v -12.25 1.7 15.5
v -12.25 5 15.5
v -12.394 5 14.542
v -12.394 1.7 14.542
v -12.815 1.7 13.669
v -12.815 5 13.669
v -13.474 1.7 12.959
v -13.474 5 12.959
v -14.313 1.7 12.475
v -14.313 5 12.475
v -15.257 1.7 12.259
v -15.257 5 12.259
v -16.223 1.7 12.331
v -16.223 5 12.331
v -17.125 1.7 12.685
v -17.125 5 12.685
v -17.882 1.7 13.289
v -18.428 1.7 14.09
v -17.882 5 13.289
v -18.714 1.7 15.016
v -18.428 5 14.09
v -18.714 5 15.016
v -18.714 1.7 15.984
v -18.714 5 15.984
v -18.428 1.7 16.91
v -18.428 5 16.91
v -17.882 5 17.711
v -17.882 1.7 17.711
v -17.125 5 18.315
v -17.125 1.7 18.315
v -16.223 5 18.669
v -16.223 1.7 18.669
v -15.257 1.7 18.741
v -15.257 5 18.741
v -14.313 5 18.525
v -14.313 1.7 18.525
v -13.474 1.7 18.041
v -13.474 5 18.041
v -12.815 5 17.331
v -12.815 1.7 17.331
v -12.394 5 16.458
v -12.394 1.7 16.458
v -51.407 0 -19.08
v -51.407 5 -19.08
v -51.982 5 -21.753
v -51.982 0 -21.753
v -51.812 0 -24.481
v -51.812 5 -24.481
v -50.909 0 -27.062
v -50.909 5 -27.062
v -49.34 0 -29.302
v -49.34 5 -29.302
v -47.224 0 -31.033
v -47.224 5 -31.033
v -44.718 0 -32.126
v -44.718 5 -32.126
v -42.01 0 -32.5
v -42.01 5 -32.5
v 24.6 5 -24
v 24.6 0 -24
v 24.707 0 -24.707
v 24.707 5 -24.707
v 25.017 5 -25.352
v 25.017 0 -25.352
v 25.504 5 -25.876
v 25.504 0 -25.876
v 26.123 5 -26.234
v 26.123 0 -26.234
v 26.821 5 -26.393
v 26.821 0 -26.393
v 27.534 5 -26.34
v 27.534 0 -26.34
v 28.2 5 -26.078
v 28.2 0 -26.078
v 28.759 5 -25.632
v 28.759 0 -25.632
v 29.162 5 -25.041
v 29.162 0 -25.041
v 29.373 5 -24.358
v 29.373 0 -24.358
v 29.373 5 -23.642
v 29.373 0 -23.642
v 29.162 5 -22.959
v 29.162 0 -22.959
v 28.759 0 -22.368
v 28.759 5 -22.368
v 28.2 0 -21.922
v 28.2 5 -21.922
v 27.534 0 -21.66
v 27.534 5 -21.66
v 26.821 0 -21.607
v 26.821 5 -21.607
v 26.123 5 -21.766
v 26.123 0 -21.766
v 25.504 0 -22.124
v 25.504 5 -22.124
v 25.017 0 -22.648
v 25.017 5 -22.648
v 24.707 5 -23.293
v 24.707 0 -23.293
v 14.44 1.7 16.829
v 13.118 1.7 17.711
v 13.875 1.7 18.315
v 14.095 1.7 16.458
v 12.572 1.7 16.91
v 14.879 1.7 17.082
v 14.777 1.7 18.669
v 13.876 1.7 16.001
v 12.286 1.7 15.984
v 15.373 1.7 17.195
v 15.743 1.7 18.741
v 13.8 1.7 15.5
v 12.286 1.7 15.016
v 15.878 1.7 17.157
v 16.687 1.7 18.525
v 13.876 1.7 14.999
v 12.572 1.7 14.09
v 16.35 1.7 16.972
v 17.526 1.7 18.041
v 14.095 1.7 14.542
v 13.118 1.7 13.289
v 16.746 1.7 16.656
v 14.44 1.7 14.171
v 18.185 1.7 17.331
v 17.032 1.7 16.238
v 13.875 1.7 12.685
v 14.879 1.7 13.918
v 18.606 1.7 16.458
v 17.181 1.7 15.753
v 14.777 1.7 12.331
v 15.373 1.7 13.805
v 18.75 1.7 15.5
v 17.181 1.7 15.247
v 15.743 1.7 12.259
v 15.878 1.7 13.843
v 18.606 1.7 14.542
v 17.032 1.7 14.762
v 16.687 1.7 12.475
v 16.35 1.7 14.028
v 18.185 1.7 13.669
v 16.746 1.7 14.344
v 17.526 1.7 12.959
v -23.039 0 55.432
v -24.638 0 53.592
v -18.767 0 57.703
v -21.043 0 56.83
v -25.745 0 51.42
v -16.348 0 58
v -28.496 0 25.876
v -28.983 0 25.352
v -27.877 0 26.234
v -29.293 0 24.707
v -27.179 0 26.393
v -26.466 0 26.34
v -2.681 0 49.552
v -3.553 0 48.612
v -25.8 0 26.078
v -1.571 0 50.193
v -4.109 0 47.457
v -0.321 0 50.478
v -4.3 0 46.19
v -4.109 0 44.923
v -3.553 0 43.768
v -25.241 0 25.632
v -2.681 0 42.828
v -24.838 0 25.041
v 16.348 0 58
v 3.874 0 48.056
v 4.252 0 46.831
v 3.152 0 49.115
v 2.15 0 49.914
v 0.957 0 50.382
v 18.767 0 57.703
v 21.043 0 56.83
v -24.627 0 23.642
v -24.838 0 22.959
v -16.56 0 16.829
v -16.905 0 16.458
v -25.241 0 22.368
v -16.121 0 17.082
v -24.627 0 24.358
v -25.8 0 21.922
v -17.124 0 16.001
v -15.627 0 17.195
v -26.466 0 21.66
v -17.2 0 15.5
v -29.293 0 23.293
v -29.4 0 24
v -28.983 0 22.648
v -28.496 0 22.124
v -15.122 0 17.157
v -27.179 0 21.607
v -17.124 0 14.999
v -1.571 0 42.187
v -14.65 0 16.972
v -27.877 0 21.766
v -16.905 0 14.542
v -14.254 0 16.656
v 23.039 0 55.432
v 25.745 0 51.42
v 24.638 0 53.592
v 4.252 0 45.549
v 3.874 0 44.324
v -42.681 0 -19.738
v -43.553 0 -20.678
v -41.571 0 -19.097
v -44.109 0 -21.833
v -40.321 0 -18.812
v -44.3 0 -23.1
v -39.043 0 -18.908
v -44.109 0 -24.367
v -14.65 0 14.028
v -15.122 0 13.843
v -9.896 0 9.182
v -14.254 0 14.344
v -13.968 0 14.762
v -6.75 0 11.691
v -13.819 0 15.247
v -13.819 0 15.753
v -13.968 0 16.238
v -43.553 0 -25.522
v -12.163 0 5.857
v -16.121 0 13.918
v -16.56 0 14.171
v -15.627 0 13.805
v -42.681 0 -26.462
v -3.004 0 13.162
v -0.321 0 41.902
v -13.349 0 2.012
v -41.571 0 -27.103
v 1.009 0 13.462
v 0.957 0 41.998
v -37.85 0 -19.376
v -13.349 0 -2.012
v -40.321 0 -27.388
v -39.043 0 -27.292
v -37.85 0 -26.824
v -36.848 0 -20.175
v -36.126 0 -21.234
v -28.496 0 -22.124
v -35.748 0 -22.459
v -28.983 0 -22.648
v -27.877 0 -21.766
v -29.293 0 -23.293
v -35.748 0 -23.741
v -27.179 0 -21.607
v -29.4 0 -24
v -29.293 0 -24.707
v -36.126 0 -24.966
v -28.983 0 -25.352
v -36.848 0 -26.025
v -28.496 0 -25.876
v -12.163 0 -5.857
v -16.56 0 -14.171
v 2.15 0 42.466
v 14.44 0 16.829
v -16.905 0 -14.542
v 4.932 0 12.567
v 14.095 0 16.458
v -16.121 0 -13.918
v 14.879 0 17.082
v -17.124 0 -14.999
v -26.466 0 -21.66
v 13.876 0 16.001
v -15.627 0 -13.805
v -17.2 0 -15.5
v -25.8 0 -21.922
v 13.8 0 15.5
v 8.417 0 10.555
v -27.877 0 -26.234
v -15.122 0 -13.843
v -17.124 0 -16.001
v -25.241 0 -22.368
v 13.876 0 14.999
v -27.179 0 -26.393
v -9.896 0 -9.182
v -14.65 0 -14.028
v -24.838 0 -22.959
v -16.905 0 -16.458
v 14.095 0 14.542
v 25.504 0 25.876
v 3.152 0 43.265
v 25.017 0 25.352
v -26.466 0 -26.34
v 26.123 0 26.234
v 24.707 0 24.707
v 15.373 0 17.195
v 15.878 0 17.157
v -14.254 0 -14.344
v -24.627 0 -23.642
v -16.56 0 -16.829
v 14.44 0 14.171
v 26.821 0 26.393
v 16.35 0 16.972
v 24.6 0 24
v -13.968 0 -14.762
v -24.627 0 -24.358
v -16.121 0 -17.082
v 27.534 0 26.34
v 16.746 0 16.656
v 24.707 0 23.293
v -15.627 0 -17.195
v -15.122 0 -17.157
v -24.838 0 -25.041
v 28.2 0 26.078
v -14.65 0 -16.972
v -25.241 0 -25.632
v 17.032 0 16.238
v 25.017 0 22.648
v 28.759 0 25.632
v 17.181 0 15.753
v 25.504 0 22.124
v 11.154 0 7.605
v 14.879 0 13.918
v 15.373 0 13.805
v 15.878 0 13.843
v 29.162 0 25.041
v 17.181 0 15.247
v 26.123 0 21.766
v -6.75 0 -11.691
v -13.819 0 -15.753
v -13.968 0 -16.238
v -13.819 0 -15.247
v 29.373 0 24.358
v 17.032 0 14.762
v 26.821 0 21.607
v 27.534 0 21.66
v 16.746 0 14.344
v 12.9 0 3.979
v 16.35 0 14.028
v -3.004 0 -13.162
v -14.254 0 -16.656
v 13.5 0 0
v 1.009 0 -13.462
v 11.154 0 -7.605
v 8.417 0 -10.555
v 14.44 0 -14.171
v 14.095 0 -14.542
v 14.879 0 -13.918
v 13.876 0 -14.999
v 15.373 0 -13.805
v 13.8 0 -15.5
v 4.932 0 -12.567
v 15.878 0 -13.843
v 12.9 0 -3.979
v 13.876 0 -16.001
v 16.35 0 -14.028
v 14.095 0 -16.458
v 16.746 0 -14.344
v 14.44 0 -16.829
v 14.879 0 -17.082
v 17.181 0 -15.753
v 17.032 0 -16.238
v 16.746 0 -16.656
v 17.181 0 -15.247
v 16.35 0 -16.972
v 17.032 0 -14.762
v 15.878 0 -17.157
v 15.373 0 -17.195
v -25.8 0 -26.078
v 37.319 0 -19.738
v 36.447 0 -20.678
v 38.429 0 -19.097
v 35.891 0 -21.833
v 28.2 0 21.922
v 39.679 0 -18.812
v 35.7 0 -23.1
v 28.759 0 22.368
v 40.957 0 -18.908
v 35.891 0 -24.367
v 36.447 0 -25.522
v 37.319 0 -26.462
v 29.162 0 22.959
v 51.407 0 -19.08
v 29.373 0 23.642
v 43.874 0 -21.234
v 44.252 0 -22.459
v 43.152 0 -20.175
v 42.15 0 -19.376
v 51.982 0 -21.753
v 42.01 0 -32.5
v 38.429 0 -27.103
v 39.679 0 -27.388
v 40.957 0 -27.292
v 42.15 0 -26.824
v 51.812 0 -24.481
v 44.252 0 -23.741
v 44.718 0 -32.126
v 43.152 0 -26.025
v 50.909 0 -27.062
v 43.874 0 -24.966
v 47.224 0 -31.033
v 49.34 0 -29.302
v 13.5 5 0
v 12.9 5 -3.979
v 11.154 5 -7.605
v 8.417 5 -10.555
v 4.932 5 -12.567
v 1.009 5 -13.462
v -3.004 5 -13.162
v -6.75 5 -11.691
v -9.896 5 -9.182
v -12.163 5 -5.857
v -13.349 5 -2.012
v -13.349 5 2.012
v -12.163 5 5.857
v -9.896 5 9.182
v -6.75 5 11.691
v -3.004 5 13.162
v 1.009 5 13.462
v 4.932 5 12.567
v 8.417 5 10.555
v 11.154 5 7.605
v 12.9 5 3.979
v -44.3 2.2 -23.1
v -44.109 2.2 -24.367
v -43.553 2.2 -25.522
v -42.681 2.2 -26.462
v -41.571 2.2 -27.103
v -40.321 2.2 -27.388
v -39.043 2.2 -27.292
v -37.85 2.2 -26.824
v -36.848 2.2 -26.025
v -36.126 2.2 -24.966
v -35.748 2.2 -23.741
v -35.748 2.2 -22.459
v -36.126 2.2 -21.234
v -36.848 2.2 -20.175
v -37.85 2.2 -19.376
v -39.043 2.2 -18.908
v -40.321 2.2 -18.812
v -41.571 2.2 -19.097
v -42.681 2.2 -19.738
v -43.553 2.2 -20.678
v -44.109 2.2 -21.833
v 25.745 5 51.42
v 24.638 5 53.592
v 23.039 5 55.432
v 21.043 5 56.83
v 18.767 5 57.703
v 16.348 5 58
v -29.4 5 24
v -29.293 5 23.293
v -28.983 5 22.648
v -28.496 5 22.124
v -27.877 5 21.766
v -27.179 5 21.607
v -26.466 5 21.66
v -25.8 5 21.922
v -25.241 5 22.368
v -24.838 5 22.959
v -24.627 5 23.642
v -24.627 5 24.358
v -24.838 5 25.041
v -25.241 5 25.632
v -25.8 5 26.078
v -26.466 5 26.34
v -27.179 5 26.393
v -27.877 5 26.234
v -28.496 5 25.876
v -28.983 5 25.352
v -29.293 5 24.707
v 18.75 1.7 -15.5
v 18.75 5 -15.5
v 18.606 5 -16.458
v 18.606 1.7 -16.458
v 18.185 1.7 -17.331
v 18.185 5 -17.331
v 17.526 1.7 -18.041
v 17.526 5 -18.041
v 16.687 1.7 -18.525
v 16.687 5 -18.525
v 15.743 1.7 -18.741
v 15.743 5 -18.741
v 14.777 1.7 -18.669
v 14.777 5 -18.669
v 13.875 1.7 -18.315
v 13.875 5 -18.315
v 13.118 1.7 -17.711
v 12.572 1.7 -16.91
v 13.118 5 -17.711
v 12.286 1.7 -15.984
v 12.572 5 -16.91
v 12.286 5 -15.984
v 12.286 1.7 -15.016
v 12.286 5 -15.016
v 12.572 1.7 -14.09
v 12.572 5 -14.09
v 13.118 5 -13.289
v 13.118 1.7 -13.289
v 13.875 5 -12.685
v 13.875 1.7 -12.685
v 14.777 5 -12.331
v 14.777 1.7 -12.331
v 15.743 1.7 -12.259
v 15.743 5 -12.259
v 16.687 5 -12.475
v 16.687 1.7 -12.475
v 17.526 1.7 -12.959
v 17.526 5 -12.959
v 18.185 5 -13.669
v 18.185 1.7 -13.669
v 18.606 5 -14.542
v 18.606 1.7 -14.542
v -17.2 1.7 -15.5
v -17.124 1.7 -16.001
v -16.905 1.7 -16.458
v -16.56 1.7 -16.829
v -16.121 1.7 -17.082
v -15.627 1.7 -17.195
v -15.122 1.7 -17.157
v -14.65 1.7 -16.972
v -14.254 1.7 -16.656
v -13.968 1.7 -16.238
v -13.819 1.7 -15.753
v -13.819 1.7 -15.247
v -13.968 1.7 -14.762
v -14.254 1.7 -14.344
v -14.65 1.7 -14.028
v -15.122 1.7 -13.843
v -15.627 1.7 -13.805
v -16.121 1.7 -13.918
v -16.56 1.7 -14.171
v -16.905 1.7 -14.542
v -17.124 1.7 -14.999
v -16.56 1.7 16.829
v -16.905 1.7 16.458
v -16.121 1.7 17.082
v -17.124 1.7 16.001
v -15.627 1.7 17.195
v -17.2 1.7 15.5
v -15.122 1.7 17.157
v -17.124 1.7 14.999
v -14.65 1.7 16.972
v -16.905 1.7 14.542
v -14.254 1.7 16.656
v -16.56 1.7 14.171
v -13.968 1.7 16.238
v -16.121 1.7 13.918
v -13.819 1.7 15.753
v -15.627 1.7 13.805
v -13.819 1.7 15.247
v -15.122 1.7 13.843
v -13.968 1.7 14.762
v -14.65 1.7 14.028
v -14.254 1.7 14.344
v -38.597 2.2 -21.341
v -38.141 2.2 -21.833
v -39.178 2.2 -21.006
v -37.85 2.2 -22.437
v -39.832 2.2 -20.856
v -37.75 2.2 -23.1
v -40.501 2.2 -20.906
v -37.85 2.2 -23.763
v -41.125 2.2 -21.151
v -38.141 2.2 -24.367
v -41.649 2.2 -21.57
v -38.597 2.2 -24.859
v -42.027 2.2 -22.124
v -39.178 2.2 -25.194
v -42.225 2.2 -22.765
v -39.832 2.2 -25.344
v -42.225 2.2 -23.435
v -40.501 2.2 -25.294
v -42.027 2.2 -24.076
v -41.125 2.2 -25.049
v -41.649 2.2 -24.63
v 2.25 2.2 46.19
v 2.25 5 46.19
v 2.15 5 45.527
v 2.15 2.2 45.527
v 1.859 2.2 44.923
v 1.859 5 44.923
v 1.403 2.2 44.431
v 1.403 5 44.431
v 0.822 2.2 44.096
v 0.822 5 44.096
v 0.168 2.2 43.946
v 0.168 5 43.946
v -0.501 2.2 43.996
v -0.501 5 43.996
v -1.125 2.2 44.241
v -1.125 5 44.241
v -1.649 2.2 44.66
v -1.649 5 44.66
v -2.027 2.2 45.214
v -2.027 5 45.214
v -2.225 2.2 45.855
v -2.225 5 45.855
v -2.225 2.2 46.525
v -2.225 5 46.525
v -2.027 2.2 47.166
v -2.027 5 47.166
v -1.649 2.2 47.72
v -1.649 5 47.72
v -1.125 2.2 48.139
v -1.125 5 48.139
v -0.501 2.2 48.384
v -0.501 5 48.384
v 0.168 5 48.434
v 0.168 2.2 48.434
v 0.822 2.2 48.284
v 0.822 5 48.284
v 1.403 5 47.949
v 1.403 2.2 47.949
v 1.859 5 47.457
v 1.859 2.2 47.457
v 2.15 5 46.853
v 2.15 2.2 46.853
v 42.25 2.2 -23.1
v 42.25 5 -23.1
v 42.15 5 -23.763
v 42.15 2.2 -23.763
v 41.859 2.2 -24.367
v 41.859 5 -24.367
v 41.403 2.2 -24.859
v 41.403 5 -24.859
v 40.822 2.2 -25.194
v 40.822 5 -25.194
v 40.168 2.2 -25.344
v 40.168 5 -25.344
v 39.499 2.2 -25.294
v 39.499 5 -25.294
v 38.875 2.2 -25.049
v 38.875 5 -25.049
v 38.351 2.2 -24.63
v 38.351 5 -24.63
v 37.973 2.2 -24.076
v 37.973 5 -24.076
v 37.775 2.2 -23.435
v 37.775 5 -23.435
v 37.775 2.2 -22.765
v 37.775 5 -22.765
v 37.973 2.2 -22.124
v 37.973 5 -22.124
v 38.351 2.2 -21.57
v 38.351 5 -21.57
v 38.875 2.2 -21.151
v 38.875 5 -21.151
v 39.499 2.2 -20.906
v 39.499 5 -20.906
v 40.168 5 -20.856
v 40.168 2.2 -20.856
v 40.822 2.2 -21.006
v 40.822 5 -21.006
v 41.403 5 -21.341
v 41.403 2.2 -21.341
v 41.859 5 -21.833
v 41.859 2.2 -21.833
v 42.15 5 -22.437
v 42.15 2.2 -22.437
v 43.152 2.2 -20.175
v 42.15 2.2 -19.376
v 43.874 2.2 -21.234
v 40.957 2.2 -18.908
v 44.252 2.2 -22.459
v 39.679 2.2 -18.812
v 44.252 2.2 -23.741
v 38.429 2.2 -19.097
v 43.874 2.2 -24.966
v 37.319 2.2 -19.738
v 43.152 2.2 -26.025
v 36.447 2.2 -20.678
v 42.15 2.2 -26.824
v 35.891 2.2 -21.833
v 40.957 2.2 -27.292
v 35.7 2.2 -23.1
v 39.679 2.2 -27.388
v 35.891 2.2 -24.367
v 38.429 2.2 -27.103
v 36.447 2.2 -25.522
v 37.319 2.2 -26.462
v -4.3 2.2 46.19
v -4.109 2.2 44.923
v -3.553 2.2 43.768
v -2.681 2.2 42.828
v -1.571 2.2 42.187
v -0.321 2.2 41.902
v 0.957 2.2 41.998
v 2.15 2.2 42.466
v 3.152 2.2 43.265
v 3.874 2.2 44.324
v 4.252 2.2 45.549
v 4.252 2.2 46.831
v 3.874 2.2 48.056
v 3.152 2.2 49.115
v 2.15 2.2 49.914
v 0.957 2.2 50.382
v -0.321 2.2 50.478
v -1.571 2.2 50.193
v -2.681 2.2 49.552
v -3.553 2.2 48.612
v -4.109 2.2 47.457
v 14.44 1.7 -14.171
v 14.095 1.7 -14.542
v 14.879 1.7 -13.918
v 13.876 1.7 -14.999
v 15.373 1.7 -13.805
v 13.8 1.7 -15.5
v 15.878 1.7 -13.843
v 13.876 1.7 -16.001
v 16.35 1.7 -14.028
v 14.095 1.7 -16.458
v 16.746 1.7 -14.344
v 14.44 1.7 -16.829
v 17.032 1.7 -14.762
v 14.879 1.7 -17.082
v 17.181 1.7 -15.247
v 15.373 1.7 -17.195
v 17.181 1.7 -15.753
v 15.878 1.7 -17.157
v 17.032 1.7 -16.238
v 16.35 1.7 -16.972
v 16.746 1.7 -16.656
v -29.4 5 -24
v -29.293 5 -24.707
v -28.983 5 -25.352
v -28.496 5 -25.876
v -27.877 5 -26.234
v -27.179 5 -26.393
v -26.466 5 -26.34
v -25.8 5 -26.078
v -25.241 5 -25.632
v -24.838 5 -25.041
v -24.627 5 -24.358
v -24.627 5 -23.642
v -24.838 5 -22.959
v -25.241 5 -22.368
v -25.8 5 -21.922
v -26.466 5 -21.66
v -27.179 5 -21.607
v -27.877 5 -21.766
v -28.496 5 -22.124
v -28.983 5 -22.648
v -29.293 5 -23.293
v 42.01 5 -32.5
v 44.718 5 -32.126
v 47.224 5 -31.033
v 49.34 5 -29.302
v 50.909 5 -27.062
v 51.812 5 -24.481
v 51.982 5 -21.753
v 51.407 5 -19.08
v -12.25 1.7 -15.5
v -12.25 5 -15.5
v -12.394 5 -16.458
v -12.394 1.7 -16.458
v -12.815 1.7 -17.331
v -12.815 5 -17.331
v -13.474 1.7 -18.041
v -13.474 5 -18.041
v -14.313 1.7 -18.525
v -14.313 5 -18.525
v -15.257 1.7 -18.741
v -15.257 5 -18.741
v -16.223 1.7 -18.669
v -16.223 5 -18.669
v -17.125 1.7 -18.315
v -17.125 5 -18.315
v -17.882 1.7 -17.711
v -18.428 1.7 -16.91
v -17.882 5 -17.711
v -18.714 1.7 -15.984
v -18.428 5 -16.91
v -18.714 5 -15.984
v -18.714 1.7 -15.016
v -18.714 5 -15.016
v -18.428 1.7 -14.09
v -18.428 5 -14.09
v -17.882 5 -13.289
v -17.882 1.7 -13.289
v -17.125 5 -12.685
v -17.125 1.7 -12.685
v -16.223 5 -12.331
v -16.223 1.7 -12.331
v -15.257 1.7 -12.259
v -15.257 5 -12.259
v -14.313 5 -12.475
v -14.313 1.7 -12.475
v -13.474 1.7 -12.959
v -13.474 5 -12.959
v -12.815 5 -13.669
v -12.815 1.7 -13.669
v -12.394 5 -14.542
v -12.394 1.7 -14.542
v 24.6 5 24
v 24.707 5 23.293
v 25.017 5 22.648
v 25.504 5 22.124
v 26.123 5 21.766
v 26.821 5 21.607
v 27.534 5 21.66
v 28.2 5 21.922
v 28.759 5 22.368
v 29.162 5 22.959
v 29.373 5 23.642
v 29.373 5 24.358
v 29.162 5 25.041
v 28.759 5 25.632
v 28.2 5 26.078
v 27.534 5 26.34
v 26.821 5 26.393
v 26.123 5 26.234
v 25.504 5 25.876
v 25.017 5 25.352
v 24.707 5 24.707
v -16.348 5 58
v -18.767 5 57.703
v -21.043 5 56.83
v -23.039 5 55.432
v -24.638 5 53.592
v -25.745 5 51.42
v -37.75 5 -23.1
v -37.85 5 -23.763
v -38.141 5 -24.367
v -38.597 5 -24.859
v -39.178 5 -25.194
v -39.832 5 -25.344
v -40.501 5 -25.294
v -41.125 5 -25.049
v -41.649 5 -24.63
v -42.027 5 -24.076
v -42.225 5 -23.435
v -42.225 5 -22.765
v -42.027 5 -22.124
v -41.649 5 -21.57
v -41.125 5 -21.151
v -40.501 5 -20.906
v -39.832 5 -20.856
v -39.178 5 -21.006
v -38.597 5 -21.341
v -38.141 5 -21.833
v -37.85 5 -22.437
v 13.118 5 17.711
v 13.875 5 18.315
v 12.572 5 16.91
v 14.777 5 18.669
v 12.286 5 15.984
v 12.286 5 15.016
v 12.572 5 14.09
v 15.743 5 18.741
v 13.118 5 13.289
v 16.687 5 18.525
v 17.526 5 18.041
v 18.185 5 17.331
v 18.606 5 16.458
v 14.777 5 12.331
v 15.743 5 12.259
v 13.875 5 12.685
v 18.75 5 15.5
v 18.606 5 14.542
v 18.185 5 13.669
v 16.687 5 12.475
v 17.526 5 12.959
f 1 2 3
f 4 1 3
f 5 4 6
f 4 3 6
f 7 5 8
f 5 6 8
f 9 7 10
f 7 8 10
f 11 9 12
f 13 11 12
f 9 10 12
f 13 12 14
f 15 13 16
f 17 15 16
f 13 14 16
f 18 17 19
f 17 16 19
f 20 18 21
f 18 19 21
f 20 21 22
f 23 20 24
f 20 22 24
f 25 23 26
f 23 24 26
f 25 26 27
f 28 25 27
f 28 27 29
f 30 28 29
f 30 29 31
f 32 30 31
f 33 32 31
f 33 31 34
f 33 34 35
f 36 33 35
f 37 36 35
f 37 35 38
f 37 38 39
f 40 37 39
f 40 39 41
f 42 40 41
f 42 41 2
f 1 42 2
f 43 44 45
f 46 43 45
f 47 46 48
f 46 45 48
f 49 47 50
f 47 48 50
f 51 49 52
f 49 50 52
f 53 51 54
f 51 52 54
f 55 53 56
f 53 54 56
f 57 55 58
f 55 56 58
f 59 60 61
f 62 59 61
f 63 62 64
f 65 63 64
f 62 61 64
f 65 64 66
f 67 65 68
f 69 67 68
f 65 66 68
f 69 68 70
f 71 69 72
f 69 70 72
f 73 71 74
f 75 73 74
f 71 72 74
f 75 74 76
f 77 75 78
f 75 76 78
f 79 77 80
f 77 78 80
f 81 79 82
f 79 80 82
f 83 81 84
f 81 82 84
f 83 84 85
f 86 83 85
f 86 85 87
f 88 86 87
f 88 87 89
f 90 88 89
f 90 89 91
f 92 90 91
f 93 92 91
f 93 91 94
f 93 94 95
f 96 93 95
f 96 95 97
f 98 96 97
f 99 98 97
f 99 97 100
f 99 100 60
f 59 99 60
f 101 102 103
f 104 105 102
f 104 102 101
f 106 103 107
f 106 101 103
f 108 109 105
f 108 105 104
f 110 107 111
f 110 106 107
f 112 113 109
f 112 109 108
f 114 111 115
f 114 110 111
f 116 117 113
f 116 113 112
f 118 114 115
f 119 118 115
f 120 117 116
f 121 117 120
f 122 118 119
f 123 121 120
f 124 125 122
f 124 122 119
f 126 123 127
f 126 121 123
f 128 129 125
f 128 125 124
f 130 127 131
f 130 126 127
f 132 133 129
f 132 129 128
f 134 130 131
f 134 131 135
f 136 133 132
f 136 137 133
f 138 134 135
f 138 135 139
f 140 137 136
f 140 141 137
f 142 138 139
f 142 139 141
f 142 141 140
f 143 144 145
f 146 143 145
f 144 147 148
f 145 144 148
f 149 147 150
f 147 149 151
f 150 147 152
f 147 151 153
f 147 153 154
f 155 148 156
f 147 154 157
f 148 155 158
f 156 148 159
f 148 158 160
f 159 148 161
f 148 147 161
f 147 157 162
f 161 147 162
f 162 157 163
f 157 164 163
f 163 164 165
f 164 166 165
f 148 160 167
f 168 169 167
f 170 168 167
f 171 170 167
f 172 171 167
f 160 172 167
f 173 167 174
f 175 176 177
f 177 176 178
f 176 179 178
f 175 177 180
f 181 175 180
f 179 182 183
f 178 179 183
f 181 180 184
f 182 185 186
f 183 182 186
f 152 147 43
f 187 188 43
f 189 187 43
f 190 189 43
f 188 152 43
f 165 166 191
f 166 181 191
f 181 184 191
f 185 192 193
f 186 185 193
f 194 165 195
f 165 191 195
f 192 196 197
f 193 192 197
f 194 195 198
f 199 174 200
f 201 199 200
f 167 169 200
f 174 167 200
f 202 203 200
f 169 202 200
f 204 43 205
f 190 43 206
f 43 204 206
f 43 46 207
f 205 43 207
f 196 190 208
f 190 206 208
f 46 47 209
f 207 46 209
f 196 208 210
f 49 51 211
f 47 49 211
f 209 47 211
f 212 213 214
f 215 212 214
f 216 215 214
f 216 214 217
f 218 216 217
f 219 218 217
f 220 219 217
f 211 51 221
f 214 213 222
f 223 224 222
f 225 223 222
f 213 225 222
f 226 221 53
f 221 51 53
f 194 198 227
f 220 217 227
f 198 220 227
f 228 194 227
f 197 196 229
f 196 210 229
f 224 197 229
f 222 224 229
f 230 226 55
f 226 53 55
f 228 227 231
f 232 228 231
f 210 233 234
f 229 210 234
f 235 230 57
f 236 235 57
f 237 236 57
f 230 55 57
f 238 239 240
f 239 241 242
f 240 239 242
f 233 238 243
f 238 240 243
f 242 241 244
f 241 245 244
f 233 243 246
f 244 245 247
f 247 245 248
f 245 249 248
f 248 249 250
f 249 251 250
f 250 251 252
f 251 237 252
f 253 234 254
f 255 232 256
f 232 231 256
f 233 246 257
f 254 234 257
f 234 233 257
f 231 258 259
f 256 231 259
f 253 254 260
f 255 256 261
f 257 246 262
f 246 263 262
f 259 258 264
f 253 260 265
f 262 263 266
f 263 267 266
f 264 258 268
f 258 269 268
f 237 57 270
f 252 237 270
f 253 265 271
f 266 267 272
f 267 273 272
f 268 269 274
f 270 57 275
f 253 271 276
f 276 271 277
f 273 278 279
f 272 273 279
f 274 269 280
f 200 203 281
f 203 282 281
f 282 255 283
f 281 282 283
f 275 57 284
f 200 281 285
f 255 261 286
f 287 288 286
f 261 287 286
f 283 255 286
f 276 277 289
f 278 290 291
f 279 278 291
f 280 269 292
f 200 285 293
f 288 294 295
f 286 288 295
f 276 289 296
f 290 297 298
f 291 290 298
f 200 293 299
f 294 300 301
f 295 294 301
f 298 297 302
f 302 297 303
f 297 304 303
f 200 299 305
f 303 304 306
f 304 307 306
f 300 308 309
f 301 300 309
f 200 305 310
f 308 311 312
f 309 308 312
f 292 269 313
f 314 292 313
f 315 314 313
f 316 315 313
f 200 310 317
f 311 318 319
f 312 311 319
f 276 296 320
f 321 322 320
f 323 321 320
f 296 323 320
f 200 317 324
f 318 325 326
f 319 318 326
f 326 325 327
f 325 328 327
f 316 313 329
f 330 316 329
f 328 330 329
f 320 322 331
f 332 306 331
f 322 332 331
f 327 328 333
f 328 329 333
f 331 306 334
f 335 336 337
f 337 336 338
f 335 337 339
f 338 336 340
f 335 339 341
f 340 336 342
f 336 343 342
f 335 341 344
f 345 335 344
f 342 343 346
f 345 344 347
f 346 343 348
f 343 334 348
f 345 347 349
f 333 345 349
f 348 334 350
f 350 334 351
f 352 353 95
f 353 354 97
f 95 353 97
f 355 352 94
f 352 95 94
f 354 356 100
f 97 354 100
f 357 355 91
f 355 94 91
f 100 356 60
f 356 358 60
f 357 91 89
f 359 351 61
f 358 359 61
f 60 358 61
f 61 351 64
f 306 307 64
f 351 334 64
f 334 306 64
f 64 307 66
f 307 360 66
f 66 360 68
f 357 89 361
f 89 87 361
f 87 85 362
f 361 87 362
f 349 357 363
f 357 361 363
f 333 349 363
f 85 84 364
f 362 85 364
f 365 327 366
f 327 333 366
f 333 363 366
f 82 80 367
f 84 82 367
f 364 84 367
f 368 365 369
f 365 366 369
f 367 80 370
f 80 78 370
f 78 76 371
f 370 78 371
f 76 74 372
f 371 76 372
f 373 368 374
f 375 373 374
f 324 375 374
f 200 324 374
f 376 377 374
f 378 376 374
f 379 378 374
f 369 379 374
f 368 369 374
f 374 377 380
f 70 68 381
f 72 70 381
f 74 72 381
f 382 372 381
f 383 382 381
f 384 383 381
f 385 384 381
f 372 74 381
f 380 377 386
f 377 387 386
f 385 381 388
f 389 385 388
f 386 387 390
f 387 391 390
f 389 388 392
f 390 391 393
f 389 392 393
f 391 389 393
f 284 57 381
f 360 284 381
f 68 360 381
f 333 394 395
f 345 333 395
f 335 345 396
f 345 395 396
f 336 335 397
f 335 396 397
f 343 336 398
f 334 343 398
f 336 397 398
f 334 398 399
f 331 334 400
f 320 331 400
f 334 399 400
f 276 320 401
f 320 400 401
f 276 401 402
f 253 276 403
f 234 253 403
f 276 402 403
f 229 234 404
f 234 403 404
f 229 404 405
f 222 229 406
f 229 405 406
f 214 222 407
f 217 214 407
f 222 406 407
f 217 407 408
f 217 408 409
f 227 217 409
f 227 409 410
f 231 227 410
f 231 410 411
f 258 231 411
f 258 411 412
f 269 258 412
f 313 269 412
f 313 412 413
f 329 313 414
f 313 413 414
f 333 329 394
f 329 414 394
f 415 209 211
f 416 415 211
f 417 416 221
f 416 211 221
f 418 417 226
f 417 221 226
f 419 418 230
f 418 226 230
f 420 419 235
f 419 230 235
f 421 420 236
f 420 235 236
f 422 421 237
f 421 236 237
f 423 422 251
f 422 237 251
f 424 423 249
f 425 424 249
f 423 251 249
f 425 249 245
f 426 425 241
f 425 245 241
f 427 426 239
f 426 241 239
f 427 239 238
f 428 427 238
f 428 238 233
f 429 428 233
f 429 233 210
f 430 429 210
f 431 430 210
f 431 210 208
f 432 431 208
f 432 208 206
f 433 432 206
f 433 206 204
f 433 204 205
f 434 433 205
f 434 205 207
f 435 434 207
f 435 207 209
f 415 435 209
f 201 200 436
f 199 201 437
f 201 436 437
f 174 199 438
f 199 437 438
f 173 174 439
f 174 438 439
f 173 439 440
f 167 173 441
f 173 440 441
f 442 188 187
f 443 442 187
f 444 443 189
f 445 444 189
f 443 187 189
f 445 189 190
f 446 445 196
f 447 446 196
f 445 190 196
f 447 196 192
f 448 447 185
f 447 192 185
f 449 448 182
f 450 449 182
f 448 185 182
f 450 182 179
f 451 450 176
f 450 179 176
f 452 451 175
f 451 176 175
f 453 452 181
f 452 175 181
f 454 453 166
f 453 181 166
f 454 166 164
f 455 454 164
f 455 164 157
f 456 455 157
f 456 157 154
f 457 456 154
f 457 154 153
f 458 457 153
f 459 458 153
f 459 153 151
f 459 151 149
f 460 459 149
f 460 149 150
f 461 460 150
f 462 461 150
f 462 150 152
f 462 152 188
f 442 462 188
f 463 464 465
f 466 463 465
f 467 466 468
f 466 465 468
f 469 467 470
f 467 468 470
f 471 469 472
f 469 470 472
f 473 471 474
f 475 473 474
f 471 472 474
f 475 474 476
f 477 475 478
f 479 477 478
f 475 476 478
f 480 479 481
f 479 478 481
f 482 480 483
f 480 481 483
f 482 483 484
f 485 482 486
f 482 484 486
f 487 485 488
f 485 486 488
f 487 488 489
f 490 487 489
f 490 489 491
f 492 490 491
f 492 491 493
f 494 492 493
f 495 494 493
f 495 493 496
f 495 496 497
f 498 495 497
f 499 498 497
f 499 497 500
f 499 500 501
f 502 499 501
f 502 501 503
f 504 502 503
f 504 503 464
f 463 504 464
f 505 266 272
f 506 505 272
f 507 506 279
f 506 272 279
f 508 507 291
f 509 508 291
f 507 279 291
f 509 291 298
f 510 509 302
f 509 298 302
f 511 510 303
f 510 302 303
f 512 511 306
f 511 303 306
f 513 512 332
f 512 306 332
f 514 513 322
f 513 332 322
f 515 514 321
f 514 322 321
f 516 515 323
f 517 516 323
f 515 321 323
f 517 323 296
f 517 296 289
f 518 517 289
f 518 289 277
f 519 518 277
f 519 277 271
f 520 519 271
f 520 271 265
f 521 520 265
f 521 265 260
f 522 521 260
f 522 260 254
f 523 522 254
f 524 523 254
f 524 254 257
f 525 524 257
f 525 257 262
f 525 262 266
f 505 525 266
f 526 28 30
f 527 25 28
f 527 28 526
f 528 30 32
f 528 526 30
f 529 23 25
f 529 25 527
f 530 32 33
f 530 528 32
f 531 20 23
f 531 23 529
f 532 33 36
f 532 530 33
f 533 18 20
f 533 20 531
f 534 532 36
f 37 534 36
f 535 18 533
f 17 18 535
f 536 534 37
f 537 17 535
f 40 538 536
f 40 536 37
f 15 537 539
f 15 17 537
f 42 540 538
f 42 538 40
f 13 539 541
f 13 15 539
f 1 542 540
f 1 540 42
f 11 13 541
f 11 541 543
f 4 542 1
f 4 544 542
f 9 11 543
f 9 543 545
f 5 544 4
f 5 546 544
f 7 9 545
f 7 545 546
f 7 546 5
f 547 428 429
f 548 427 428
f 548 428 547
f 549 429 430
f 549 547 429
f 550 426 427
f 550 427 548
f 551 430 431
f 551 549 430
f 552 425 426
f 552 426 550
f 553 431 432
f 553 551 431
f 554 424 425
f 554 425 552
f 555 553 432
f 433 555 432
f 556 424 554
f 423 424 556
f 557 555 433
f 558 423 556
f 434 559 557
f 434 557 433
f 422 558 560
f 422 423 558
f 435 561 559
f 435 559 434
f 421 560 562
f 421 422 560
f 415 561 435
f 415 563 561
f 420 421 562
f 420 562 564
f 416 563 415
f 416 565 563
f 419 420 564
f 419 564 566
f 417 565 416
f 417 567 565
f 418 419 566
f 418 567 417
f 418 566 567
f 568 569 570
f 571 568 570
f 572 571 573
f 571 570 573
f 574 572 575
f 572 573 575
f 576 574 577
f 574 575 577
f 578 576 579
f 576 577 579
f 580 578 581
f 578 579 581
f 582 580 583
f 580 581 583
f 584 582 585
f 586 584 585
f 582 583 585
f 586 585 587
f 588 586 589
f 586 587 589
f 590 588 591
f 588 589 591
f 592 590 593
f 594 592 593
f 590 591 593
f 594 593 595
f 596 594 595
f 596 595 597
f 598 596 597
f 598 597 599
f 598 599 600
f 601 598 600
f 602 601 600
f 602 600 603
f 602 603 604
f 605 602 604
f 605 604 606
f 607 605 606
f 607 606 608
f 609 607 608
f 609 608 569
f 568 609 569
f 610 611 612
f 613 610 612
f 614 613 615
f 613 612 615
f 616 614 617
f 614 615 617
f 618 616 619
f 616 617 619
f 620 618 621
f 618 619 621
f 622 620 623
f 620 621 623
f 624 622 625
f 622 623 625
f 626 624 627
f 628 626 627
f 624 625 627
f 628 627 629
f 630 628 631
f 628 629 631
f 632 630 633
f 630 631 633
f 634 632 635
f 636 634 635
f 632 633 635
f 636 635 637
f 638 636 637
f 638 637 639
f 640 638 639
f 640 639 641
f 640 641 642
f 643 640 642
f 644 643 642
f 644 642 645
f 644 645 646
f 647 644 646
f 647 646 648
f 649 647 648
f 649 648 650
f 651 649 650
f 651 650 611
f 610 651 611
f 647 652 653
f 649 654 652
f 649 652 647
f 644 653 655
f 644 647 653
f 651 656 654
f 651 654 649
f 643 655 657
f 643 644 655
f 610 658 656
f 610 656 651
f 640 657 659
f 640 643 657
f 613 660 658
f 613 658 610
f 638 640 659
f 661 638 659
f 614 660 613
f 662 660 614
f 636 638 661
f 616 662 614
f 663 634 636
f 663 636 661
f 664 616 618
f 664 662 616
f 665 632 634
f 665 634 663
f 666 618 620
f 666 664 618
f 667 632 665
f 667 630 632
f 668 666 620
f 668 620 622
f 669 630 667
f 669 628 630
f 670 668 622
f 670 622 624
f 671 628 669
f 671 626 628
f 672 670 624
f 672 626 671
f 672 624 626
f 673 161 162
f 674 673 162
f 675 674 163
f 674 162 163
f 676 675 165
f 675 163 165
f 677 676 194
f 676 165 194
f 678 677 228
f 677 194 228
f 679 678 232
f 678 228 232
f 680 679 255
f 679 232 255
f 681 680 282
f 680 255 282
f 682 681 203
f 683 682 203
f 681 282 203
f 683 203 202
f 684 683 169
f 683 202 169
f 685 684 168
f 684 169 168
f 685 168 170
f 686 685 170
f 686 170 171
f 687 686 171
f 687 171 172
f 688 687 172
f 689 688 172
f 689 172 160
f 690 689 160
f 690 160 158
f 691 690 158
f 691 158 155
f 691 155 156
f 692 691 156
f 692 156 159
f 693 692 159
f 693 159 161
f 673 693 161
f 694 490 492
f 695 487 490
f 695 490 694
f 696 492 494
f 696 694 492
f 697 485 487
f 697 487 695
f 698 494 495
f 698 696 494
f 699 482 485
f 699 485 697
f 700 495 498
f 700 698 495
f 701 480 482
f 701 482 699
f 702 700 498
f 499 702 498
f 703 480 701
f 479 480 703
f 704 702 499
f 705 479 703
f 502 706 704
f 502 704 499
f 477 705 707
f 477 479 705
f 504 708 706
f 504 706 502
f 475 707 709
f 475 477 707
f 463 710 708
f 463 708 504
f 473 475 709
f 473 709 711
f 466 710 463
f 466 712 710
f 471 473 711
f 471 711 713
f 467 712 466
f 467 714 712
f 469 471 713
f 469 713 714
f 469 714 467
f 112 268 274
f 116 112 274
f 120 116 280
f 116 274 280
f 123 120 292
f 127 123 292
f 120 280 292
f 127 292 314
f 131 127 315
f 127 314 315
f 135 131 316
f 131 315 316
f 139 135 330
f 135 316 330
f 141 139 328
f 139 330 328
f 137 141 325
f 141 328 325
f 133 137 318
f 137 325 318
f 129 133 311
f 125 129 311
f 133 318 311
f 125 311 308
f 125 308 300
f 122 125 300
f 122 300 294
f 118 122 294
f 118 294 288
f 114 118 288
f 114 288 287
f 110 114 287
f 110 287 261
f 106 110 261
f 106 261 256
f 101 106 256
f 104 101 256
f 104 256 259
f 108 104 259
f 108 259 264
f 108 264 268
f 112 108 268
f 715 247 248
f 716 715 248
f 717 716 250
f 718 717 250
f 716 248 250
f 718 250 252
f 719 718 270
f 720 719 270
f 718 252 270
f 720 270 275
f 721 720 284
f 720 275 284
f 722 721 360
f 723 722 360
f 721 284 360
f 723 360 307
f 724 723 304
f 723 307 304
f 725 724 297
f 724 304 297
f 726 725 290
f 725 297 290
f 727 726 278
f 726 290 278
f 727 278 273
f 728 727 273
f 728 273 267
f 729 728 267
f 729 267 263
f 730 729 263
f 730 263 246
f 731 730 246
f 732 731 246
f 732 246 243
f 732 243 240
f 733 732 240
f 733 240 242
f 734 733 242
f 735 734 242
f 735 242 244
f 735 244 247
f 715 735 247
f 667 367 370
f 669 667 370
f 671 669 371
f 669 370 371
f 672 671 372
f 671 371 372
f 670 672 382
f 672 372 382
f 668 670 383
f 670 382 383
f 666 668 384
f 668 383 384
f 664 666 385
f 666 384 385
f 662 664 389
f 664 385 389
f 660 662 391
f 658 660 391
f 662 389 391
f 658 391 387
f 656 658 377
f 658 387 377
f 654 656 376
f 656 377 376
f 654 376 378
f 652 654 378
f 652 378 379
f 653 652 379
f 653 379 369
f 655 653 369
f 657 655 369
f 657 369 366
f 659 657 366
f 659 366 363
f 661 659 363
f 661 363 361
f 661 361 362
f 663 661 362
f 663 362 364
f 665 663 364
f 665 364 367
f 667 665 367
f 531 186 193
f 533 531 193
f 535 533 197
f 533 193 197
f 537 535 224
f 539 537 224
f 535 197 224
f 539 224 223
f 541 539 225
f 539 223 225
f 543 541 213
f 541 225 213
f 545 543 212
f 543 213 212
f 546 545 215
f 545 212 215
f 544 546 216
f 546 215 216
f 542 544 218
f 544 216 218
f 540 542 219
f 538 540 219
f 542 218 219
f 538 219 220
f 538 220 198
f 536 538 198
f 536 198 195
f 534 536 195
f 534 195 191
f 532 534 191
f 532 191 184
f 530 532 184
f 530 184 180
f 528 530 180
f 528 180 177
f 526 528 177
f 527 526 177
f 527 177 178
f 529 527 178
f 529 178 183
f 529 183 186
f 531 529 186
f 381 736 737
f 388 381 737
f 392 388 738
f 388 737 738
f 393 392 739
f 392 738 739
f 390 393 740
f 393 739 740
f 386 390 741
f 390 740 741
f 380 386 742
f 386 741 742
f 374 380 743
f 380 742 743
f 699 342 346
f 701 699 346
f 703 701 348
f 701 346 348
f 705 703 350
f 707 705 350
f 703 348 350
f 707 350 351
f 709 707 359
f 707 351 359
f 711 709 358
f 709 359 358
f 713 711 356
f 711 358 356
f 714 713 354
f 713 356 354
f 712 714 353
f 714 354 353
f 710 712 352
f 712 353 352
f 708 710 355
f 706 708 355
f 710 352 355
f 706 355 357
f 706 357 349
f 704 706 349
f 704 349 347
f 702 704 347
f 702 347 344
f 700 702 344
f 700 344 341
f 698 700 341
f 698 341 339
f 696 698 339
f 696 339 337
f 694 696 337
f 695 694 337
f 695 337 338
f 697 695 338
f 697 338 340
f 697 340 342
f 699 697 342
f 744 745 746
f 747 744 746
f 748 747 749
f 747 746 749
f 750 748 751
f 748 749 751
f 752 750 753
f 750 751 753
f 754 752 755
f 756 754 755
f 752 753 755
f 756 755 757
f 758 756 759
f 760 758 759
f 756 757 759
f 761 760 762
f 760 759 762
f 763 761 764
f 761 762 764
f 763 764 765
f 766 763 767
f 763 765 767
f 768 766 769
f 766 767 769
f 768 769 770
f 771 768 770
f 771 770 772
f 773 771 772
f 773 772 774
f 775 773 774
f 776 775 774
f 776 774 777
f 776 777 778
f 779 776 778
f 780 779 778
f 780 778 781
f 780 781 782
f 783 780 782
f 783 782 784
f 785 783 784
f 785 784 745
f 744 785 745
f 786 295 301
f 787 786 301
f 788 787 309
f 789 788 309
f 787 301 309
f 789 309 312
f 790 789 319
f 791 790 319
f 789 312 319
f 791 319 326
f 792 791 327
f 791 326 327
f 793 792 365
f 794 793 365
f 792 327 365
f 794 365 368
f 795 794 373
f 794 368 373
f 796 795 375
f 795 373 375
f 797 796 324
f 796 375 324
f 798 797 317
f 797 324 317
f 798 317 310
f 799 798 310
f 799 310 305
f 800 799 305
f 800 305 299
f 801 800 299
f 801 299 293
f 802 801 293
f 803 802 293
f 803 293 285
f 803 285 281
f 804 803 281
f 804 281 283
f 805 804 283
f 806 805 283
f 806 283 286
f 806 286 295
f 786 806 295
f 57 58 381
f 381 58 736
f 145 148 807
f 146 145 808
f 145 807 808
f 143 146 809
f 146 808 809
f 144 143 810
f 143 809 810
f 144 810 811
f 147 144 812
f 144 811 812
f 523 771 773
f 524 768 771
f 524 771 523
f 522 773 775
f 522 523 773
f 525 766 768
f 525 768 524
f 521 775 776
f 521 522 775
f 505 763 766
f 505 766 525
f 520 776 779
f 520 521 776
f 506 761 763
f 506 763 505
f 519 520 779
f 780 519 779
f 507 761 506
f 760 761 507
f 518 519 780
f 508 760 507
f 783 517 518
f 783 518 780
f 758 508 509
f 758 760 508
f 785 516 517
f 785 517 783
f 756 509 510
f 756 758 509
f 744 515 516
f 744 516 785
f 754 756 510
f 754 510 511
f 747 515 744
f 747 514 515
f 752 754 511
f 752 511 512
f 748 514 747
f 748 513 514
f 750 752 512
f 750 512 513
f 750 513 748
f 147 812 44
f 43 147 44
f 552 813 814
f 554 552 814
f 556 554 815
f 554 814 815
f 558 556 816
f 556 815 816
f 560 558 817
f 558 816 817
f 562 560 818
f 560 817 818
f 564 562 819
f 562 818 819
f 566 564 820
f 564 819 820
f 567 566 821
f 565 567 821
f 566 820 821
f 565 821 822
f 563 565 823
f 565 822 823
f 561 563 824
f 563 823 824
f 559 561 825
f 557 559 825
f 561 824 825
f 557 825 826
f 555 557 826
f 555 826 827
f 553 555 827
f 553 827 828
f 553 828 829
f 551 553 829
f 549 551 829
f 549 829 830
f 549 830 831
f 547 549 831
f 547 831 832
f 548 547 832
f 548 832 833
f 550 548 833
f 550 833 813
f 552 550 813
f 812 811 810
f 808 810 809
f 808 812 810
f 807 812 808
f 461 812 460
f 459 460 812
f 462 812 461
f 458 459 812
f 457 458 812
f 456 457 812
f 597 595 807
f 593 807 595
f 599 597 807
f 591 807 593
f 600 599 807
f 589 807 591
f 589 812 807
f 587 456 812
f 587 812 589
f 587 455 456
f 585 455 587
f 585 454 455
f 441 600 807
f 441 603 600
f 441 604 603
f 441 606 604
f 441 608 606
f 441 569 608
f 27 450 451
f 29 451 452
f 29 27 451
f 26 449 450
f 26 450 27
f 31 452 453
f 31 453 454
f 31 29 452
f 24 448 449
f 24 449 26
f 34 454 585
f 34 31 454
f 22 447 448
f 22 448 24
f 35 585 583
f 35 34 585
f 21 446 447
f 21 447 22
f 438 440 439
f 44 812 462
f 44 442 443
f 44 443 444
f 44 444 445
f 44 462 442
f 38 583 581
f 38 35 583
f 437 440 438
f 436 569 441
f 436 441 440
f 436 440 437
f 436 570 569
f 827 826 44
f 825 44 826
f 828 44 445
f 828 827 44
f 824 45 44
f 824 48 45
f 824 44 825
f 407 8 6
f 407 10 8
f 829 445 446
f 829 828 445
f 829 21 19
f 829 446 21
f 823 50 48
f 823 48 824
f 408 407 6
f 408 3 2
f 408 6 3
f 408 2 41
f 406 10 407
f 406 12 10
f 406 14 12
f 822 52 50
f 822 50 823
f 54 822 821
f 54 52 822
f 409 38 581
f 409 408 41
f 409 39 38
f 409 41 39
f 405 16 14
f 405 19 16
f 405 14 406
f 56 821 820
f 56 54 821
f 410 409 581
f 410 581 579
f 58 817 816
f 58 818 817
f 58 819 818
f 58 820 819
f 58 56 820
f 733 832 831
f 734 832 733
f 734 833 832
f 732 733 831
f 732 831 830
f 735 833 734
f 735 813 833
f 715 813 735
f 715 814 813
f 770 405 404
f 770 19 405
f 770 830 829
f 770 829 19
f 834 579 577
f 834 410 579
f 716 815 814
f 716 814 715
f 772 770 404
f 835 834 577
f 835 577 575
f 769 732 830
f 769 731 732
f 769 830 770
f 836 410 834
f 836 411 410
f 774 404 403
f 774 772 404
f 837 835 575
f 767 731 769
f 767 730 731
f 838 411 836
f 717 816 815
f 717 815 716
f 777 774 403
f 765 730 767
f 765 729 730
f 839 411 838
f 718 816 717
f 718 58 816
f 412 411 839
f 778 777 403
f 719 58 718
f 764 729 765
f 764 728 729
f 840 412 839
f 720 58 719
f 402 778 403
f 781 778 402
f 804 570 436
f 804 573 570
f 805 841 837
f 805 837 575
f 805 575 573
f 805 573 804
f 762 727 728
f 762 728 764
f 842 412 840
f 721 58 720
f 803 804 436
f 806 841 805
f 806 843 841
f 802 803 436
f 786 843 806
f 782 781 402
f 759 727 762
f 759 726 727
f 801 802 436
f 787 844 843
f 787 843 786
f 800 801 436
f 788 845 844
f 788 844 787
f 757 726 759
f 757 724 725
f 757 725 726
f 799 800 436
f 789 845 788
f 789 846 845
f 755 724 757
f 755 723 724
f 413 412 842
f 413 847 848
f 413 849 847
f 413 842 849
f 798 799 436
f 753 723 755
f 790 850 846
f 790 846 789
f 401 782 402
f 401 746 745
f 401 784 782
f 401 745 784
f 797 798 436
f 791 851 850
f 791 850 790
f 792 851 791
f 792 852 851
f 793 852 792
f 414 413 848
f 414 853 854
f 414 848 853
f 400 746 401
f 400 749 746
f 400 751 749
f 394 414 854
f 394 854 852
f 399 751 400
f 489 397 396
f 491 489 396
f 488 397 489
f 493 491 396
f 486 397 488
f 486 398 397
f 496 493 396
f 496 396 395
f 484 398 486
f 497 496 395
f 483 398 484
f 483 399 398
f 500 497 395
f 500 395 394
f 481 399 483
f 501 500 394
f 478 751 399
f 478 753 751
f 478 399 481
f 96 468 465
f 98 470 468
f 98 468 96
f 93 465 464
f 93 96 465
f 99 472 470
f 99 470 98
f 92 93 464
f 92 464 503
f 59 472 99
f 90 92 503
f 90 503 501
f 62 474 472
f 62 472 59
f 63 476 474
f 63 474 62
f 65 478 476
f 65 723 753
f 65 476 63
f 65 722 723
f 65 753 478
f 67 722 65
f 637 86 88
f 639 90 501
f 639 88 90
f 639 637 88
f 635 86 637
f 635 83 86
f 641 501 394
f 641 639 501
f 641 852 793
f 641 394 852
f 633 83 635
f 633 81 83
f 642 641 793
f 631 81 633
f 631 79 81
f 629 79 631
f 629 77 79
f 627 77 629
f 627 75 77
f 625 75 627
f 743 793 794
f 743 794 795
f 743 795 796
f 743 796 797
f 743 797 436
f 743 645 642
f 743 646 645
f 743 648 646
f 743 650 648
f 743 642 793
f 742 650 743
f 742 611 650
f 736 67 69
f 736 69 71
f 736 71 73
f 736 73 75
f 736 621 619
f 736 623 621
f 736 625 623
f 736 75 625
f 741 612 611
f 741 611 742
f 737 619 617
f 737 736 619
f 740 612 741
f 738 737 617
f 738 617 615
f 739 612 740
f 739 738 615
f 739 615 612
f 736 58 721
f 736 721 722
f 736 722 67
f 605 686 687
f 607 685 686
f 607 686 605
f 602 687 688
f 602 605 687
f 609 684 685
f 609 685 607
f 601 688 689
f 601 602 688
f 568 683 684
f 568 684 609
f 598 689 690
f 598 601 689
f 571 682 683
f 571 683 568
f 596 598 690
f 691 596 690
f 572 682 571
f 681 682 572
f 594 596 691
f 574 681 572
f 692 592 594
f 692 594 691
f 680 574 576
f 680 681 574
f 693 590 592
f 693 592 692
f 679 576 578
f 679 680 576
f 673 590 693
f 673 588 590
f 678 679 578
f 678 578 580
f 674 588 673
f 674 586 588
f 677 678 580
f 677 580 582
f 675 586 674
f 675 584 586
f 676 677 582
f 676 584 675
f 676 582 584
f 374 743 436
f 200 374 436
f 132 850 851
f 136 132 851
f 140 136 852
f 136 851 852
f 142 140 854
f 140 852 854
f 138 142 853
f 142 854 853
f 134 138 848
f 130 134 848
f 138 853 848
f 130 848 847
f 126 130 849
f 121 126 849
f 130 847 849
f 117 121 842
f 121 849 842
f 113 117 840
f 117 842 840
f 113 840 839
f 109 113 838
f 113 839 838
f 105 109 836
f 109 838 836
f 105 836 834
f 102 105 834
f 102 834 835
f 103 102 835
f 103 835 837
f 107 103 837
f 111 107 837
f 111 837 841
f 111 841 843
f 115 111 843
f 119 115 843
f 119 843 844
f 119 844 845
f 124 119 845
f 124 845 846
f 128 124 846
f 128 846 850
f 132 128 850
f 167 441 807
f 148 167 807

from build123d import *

# Parameters (mm, degrees)
SKETCH2_W                                        = 130
SKETCH2_H                                        = 130
BOSS_EXTRUDE1_DEPTH                              = 5
SKETCH3_R                                        = 13.5
CUT_EXTRUDE1_DEPTH                               = 5
SKETCH8_W                                        = 130
SKETCH8_H                                        = 130
CUT_EXTRUDE6_DEPTH                               = 6
M4_CLEARANCE_HOLE1_D                             = 4.8
M4_CLEARANCE_HOLE1_DEPTH                         = 5
CBORE_FOR_M3_HEX_HEAD_MACHINE_SCREW1_D           = 3.4
CBORE_FOR_M3_HEX_HEAD_MACHINE_SCREW1_DEPTH       = 5
CBORE_FOR_M3_HEX_HEAD_MACHINE_SCREW1_CBORE_D     = 6.5
CBORE_FOR_M3_HEX_HEAD_MACHINE_SCREW1_CBORE_DEPTH = 3.3
CBORE_FOR_M4_SBHCS1_D                            = 4.5
CBORE_FOR_M4_SBHCS1_DEPTH                        = 5
CBORE_FOR_M4_SBHCS1_CBORE_D                      = 8.6
CBORE_FOR_M4_SBHCS1_CBORE_DEPTH                  = 2.2


with BuildPart() as part:
    # Sketch2 → Boss-Extrude1 (new body)
    with BuildSketch(Plane(origin=(0, 0, 0), x_dir=(1, 0, 0), z_dir=(0, 1, 0))):
        Rectangle(SKETCH2_W, SKETCH2_H)
    extrude(amount=BOSS_EXTRUDE1_DEPTH)

    # Sketch3 → Cut-Extrude1 (cut)
    with BuildSketch(Plane(origin=(0, 5, 0), x_dir=(1, 0, 0), z_dir=(0, 1, 0))):
        Circle(SKETCH3_R)
    extrude(amount=-CUT_EXTRUDE1_DEPTH, mode=Mode.SUBTRACT)

    # Sketch8 → Cut-Extrude6 (cut, through all)
    with BuildSketch(Plane(origin=(0, 5, 0), x_dir=(1, 0, 0), z_dir=(0, 1, 0))):
        Rectangle(SKETCH8_W, SKETCH8_H)
        with BuildLine():
            Line((-42.00982343, 32.5), (42.00982343, 32.5))
            ThreePointArc((42.00982343, 32.5), (50.201409492, 28.235670649), (51.406671379, 19.079583559))
            Line((51.406671379, 19.079583559), (25.74494306, -51.420416441))
            ThreePointArc((25.74494306, -51.420416441), (22.083765761, -56.191586062), (16.348095112, -58))
            Line((16.348095112, -58), (-16.348095112, -58))
            ThreePointArc((-16.348095112, -58), (-22.083765761, -56.191586062), (-25.74494306, -51.420416441))
            Line((-25.74494306, -51.420416441), (-51.406671379, 19.079583559))
            ThreePointArc((-51.406671379, 19.079583559), (-50.201409492, 28.235670649), (-42.00982343, 32.5))
        make_face(mode=Mode.SUBTRACT)
    extrude(amount=-CUT_EXTRUDE6_DEPTH, mode=Mode.SUBTRACT)

    # M4 Clearance Hole1
    with Locations(Plane(origin=(0, 5, 0), x_dir=(1, 0, 0), z_dir=(0, 1, 0))):
        with Locations((-27, 24), (27, 24), (27, -24), (-27, -24)):
            Hole(M4_CLEARANCE_HOLE1_D / 2, depth=M4_CLEARANCE_HOLE1_DEPTH)

    # CBORE for M3 Hex Head Machine Screw1
    with Locations(Plane(origin=(0, 5, 0), x_dir=(1, 0, 0), z_dir=(0, 1, 0))):
        with Locations((-15.5, 15.5), (15.5, 15.5), (15.5, -15.5), (-15.5, -15.5)):
            CounterBoreHole(CBORE_FOR_M3_HEX_HEAD_MACHINE_SCREW1_D / 2, CBORE_FOR_M3_HEX_HEAD_MACHINE_SCREW1_CBORE_D / 2, CBORE_FOR_M3_HEX_HEAD_MACHINE_SCREW1_CBORE_DEPTH, depth=CBORE_FOR_M3_HEX_HEAD_MACHINE_SCREW1_DEPTH)

    # CBORE for M4 SBHCS1
    with Locations(Plane(origin=(0, 0, 0), x_dir=(-1, 0, 0), z_dir=(0, -1, 0))):
        with Locations((0, -46.19), (40, 23.1), (-40, 23.1)):
            CounterBoreHole(CBORE_FOR_M4_SBHCS1_D / 2, CBORE_FOR_M4_SBHCS1_CBORE_D / 2, CBORE_FOR_M4_SBHCS1_CBORE_DEPTH, depth=CBORE_FOR_M4_SBHCS1_DEPTH)


solid = part.part
